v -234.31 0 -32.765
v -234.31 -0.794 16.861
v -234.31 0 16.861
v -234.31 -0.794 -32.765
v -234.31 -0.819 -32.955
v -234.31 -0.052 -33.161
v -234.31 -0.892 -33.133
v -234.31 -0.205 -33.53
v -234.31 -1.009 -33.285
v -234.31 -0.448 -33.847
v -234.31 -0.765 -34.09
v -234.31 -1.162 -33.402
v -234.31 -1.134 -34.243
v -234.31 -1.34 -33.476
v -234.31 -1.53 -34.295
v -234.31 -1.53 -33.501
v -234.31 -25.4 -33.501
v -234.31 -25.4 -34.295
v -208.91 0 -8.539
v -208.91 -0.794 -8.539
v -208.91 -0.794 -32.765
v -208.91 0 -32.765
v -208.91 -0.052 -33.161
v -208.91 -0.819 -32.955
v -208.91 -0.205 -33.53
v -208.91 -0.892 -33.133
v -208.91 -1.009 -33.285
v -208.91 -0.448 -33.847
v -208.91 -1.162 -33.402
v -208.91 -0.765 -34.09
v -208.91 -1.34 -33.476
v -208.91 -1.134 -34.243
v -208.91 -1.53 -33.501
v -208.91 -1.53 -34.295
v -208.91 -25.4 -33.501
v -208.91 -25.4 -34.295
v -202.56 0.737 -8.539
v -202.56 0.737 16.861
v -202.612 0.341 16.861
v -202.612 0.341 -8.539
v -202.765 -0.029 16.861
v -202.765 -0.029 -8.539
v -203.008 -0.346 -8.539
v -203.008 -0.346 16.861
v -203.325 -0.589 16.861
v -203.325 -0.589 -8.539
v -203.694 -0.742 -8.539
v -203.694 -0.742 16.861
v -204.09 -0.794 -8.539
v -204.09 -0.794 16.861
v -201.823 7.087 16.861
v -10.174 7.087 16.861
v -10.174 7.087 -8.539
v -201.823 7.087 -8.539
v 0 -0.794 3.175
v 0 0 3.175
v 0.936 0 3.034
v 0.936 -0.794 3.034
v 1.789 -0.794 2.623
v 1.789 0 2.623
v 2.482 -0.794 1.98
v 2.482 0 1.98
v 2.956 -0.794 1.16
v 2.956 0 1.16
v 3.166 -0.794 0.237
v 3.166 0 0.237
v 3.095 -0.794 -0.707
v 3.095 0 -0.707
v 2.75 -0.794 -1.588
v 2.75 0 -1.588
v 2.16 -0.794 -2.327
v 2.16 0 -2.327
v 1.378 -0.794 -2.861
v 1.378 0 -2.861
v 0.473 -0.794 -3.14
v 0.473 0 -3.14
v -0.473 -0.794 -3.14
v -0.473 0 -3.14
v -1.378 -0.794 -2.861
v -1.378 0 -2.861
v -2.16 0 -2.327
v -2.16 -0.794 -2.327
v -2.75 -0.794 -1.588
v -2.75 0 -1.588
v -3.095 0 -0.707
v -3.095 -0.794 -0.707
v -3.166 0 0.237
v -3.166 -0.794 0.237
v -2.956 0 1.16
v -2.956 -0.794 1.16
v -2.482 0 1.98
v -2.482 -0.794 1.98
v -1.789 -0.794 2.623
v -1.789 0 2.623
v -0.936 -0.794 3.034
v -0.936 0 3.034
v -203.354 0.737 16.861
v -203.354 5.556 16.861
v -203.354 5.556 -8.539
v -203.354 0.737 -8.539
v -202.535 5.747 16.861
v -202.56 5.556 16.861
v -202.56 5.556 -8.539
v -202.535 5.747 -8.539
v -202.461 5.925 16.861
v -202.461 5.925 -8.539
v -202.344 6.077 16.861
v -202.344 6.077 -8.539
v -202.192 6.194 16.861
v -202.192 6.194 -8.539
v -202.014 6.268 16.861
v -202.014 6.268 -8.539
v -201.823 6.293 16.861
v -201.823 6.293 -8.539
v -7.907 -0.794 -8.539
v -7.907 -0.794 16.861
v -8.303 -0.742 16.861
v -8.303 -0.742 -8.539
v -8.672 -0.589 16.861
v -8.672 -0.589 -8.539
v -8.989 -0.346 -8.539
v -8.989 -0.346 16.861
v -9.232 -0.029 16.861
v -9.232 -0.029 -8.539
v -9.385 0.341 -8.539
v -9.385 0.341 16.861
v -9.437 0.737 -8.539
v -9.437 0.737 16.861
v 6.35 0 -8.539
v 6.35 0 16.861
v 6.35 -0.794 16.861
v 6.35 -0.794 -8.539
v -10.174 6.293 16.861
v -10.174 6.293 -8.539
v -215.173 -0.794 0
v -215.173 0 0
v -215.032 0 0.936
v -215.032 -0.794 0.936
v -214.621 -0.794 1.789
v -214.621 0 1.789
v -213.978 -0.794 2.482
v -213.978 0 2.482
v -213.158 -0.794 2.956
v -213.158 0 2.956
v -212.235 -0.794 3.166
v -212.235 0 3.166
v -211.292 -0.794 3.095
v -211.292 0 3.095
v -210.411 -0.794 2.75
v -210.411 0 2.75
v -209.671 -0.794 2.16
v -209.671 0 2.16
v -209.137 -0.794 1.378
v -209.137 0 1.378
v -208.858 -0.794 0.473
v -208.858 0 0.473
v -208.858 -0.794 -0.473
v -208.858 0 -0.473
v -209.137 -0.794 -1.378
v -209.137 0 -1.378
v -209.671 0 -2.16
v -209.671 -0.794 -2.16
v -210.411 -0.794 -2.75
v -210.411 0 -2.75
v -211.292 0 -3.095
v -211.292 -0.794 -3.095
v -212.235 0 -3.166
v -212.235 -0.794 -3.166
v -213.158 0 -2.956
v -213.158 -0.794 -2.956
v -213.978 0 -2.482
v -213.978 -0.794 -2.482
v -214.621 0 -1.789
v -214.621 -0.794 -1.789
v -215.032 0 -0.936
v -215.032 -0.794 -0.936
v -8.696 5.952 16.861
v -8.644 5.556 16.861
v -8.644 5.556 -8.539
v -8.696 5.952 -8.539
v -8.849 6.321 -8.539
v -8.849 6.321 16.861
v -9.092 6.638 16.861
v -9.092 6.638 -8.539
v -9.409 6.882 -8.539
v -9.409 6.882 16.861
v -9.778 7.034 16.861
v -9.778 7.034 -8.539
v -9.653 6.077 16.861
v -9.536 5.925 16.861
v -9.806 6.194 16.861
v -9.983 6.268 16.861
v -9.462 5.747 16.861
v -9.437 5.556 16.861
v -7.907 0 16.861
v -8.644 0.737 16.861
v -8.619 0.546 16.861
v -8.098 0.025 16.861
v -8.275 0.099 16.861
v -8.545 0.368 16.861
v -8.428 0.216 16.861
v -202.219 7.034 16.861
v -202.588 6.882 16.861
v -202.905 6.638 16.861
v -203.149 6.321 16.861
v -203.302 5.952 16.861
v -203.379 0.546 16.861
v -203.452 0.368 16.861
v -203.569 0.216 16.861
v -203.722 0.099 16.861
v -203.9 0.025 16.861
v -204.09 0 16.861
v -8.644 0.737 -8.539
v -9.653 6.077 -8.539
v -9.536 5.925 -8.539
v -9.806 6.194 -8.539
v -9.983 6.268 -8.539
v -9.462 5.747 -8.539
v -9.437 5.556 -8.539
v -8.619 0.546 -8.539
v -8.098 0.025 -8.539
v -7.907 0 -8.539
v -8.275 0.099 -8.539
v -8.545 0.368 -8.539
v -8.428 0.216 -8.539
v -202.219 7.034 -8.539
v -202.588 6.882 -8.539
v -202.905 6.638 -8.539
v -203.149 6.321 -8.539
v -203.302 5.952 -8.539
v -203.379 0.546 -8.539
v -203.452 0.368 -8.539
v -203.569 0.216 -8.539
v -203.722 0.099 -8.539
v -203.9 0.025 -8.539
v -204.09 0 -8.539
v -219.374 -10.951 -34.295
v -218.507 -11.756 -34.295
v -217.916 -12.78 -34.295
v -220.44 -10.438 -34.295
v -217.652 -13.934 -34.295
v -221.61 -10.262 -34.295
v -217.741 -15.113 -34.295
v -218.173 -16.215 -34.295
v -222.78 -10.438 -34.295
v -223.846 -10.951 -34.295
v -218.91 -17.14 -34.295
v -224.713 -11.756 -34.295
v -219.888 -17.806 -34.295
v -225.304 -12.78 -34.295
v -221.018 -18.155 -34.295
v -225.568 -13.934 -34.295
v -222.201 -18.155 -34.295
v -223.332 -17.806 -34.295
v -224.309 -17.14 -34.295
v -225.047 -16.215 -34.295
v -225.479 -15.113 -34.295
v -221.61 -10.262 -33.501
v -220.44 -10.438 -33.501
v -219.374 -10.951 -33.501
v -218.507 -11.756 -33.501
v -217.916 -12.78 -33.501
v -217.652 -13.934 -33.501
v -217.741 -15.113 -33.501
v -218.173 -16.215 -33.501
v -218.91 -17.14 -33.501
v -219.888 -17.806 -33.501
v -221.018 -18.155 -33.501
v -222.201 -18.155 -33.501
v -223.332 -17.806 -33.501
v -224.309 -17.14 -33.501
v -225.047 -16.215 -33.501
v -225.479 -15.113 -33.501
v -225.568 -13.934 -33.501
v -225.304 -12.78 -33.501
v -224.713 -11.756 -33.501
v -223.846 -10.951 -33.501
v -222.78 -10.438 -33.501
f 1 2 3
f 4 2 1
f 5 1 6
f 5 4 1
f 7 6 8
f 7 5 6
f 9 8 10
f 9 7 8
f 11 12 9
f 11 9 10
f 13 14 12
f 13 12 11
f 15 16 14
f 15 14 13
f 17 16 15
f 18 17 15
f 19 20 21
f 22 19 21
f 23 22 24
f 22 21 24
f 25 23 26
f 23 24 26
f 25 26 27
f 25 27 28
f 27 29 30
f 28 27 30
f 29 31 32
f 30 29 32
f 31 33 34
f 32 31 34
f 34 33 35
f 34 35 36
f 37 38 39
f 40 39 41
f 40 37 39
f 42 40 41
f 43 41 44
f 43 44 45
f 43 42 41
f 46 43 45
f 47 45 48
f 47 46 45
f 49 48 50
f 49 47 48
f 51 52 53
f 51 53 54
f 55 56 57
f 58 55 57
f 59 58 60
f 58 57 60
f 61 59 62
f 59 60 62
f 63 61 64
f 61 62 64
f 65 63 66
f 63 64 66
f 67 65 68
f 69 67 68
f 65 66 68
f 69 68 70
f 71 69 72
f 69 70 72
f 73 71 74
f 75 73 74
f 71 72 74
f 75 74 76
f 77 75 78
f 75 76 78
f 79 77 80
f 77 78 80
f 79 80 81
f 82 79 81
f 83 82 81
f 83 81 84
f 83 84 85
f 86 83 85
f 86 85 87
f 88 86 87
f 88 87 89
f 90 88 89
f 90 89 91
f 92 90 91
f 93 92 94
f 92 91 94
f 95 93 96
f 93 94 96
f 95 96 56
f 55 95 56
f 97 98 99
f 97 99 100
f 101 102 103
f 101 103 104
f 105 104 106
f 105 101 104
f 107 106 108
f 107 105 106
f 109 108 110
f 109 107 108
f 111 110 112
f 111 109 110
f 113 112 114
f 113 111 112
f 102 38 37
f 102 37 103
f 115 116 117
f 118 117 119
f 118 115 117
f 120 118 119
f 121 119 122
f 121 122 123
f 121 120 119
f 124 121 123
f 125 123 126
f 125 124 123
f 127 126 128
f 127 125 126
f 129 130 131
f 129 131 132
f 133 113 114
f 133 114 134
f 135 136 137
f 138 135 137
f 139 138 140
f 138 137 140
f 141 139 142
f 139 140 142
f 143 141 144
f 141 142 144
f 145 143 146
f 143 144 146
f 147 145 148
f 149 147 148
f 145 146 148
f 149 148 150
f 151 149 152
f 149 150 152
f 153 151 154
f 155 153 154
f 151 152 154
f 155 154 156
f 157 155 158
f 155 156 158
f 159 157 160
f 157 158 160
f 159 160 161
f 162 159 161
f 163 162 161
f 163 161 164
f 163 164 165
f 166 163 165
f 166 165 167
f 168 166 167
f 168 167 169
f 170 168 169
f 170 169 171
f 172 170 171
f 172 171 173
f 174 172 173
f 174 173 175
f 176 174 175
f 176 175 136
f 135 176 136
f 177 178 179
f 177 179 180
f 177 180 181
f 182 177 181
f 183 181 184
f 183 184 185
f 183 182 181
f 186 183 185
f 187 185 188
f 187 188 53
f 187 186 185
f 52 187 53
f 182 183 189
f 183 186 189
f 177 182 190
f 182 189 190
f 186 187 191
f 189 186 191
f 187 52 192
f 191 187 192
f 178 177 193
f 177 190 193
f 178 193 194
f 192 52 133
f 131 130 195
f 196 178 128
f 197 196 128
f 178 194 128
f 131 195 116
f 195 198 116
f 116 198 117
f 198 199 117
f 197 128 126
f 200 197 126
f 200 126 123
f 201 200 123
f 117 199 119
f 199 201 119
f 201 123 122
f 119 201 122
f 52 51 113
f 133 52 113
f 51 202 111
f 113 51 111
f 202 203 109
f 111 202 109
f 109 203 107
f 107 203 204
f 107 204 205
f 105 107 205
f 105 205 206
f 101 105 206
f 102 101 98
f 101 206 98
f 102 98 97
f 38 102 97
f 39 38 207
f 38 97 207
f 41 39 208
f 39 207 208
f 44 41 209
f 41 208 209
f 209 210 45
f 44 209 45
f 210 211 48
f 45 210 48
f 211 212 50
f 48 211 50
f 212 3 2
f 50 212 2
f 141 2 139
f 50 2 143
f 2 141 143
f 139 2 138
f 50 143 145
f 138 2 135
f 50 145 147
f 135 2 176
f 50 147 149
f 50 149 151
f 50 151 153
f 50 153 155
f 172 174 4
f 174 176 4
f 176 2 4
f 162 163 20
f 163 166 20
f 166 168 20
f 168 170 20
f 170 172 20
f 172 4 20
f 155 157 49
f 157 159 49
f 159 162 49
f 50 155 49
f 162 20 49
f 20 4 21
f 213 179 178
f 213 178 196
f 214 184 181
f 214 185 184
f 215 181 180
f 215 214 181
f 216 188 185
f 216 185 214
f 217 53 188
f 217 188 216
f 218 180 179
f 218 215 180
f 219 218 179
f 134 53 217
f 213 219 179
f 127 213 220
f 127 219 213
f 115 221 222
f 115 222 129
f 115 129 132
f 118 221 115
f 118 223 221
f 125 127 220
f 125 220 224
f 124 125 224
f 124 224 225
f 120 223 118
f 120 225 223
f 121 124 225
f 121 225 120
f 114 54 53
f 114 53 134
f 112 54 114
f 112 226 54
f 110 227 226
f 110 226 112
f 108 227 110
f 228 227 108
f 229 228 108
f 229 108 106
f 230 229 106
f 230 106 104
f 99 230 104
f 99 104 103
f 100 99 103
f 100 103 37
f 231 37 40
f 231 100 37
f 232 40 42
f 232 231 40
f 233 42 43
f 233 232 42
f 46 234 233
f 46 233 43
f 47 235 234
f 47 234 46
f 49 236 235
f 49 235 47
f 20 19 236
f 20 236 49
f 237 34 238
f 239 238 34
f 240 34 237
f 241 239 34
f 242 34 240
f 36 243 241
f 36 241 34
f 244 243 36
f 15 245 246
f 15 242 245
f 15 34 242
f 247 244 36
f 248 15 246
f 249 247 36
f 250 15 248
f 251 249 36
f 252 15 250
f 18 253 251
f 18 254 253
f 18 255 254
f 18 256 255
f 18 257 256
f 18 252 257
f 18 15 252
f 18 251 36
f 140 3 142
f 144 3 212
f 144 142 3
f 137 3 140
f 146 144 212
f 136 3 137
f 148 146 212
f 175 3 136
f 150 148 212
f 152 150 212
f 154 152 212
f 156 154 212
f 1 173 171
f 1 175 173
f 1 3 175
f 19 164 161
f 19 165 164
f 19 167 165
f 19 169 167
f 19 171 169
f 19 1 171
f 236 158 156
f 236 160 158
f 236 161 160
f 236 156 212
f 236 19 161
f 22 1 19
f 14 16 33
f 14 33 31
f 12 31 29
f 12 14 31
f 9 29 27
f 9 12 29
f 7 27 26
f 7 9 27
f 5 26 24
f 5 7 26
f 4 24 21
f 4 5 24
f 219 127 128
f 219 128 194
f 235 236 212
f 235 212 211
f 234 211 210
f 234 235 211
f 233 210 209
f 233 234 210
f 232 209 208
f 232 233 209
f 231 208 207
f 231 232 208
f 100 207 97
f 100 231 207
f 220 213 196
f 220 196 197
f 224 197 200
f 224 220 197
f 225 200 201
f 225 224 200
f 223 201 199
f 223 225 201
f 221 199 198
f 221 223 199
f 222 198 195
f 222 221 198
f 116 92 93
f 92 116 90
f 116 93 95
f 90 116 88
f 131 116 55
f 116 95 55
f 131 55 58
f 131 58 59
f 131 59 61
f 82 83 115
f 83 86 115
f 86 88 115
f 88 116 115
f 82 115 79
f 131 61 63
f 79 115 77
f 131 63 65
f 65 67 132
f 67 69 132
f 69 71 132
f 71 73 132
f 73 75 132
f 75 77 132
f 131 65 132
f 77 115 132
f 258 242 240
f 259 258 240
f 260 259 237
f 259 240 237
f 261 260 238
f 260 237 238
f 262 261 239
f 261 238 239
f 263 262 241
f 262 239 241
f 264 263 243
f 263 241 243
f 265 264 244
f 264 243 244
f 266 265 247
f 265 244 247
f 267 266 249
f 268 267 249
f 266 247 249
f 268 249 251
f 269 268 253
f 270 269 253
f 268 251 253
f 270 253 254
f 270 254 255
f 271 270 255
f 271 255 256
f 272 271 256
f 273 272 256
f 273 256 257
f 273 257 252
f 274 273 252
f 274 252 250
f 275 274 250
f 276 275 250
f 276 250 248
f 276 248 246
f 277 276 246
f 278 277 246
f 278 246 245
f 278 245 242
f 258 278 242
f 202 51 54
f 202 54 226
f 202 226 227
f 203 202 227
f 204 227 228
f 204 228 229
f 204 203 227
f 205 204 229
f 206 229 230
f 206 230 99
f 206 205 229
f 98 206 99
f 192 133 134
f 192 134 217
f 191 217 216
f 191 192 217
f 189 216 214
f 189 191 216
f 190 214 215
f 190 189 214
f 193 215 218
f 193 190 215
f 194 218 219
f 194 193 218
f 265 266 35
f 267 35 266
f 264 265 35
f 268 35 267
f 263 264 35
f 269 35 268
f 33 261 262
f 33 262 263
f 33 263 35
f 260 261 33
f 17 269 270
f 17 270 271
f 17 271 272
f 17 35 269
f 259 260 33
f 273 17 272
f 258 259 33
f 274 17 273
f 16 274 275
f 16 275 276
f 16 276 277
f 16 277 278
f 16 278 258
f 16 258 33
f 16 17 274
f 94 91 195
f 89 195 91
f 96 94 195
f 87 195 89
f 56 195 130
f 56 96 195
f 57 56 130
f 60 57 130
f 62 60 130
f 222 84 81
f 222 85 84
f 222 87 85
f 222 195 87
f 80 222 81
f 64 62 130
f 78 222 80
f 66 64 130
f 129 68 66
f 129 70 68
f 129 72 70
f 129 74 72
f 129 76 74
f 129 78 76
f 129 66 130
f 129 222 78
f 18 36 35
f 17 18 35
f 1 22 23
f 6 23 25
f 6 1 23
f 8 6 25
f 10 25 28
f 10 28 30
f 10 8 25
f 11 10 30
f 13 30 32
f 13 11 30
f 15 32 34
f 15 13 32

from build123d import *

# Parameters (mm, degrees)
SKETCH1_W                    = 14.25702
SKETCH1_H                    = 25.4
SKETCH1_R                    = 3.175
BASE_FLANGE1_DEPTH           = 0.79375
EDGE_FLANGE1_DEPTH           = 25.4
EDGE_FLANGE2_DEPTH           = 25.4
EDGE_FLANGE3_DEPTH           = 25.4
EDGE_FLANGE4_STRIP_W         = 4.6482
EDGE_FLANGE4_STRIP_H         = 0.79375
EDGE_FLANGE4_STRIP_CUT_DEPTH = 25.4
EDGE_FLANGE4_DEPTH           = 25.4
SKETCH16_R                   = 3.175
CUT_EXTRUDE1_DEPTH           = 236.022644323
SKETCH17_W                   = 25.4
SKETCH17_H                   = 25.7556
TAB1_DEPTH                   = 0.79375
EDGE_FLANGE5_STRIP_W         = 4.6482
EDGE_FLANGE5_STRIP_H         = 0.79375
EDGE_FLANGE5_STRIP_CUT_DEPTH = 25.4
EDGE_FLANGE5_DEPTH           = 25.4
SKETCH25_R                   = 3.96875
CUT_EXTRUDE2_DEPTH           = 242.170466728


# Sheet-metal steps are written as plain solids
with BuildPart() as part:
    # Sketch1 → Base-Flange1 (new body)
    with BuildSketch(Plane(origin=(0, 0, 0), x_dir=(1, 0, 0), z_dir=(0, 1, 0))):
        with Locations((-0.77851, -4.160748346)):
            Rectangle(SKETCH1_W, SKETCH1_H)
        with Locations(Location((0, 0, 0), (0, 0, 270))):
            Circle(SKETCH1_R, mode=Mode.SUBTRACT)
    extrude(amount=-BASE_FLANGE1_DEPTH)

    # Edge-Flange1 section (across the edge) → Edge-Flange1 (add)
    with BuildSketch(Plane(origin=(-8.64362, 0, -8.539251654), x_dir=(1, 0, 0), z_dir=(0, 0, 1))):
        with BuildLine():
            Line((-0.79375, 0.7366), (-0.79375, 5.55625))
            Line((-0.79375, 5.55625), (0, 5.55625))
            Line((0, 5.55625), (0, 0.7366))
            ThreePointArc((0, 0.7366), (0.215745145, 0.215745145), (0.7366, 0))
            Line((0.7366, 0), (0.7366, -0.79375))
            ThreePointArc((0.7366, -0.79375), (-0.345520863, -0.345520863), (-0.79375, 0.7366))
        make_face()
    extrude(amount=EDGE_FLANGE1_DEPTH)

    # Edge-Flange2 section (across the edge) → Edge-Flange2 (add)
    with BuildSketch(Plane(origin=(-9.43737, 6.29285, 16.860748346), x_dir=(0, -1, 0), z_dir=(0, 0, -1))):
        with BuildLine():
            Line((-0.79375, 0.7366), (-0.79375, 192.38595))
            Line((-0.79375, 192.38595), (0, 192.38595))
            Line((0, 192.38595), (0, 0.7366))
            ThreePointArc((0, 0.7366), (0.215745145, 0.215745145), (0.7366, 0))
            Line((0.7366, 0), (0.7366, -0.79375))
            ThreePointArc((0.7366, -0.79375), (-0.345520863, -0.345520863), (-0.79375, 0.7366))
        make_face()
    extrude(amount=EDGE_FLANGE2_DEPTH)

    # Edge-Flange3 section (across the edge) → Edge-Flange3 (add)
    with BuildSketch(Plane(origin=(-202.55992, 6.29285, 16.860748346), x_dir=(1, 0, 0), z_dir=(0, 0, -1))):
        with BuildLine():
            Line((-0.79375, 0.7366), (-0.79375, 7.0866))
            Line((-0.79375, 7.0866), (0, 7.0866))
            Line((0, 7.0866), (0, 0.7366))
            ThreePointArc((0, 0.7366), (0.215745145, 0.215745145), (0.7366, 0))
            Line((0.7366, 0), (0.7366, -0.79375))
            ThreePointArc((0.7366, -0.79375), (-0.345520863, -0.345520863), (-0.79375, 0.7366))
        make_face()
    extrude(amount=EDGE_FLANGE3_DEPTH)

    # Edge-Flange4 strip (across the edge) → Edge-Flange4 strip cut (cut)
    with BuildSketch(Plane(origin=(-203.35367, -0.79375, -8.539251654), x_dir=(0, 1, 0), z_dir=(0, 0, 1))):
        with Locations((-0.79375, -0.396875)):
            Rectangle(EDGE_FLANGE4_STRIP_W, EDGE_FLANGE4_STRIP_H)
    extrude(amount=EDGE_FLANGE4_STRIP_CUT_DEPTH, mode=Mode.SUBTRACT)

    # Edge-Flange4 section (across the edge) → Edge-Flange4 (add)
    with BuildSketch(Plane(origin=(-203.35367, -0.79375, -8.539251654), x_dir=(0, 1, 0), z_dir=(0, 0, 1))):
        with BuildLine():
            Line((0, 0.7366), (0, 30.95625))
            Line((0, 30.95625), (0.79375, 30.95625))
            Line((0.79375, 30.95625), (0.79375, 0.7366))
            ThreePointArc((0.79375, 0.7366), (1.009495145, 0.215745145), (1.53035, 0))
            Line((1.53035, 0), (1.53035, -0.79375))
            ThreePointArc((1.53035, -0.79375), (0.448229137, -0.345520863), (0, 0.7366))
        make_face()
    extrude(amount=EDGE_FLANGE4_DEPTH)

    # Sketch16 → Cut-Extrude1 (cut, through all)
    with BuildSketch(Plane(origin=(0, 0, 0), x_dir=(1, 0, 0), z_dir=(0, 1, 0))):
        with Locations(Location((-211.998031426, 0, 0), (0, 0, 180))):
            Circle(SKETCH16_R)
    extrude(amount=-CUT_EXTRUDE1_DEPTH, mode=Mode.SUBTRACT)

    # Sketch17 → Tab1 (add)
    with BuildSketch(Plane(origin=(0, 0, 0), x_dir=(1, 0, 0), z_dir=(0, 1, 0))):
        with Locations((-221.60992, 21.417051654)):
            Rectangle(SKETCH17_W, SKETCH17_H)
    extrude(amount=-TAB1_DEPTH)

    # Edge-Flange5 strip (across the edge) → Edge-Flange5 strip cut (cut)
    with BuildSketch(Plane(origin=(-234.30992, -0.79375, -34.294851654), x_dir=(0, 0, 1), z_dir=(1, 0, 0))):
        with Locations((-0.79375, -0.396875)):
            Rectangle(EDGE_FLANGE5_STRIP_W, EDGE_FLANGE5_STRIP_H)
    extrude(amount=EDGE_FLANGE5_STRIP_CUT_DEPTH, mode=Mode.SUBTRACT)

    # Edge-Flange5 section (across the edge) → Edge-Flange5 (add)
    with BuildSketch(Plane(origin=(-234.30992, -0.79375, -34.294851654), x_dir=(0, 0, 1), z_dir=(1, 0, 0))):
        with BuildLine():
            Line((0, 0.7366), (0, 24.60625))
            Line((0, 24.60625), (0.79375, 24.60625))
            Line((0.79375, 24.60625), (0.79375, 0.7366))
            ThreePointArc((0.79375, 0.7366), (1.009495145, 0.215745145), (1.53035, 0))
            Line((1.53035, 0), (1.53035, -0.79375))
            ThreePointArc((1.53035, -0.79375), (0.448229137, -0.345520863), (0, 0.7366))
        make_face()
    extrude(amount=EDGE_FLANGE5_DEPTH)

    # Sketch25 → Cut-Extrude2 (cut, through all)
    with BuildSketch(Plane(origin=(0, 0, -34.294851654), x_dir=(-1, 0, 0), z_dir=(0, 0, -1))):
        with Locations(Location((221.60992, -14.23035, 0), (0, 0, 90))):
            Circle(SKETCH25_R)
    extrude(amount=-CUT_EXTRUDE2_DEPTH, mode=Mode.SUBTRACT)


solid = part.part
